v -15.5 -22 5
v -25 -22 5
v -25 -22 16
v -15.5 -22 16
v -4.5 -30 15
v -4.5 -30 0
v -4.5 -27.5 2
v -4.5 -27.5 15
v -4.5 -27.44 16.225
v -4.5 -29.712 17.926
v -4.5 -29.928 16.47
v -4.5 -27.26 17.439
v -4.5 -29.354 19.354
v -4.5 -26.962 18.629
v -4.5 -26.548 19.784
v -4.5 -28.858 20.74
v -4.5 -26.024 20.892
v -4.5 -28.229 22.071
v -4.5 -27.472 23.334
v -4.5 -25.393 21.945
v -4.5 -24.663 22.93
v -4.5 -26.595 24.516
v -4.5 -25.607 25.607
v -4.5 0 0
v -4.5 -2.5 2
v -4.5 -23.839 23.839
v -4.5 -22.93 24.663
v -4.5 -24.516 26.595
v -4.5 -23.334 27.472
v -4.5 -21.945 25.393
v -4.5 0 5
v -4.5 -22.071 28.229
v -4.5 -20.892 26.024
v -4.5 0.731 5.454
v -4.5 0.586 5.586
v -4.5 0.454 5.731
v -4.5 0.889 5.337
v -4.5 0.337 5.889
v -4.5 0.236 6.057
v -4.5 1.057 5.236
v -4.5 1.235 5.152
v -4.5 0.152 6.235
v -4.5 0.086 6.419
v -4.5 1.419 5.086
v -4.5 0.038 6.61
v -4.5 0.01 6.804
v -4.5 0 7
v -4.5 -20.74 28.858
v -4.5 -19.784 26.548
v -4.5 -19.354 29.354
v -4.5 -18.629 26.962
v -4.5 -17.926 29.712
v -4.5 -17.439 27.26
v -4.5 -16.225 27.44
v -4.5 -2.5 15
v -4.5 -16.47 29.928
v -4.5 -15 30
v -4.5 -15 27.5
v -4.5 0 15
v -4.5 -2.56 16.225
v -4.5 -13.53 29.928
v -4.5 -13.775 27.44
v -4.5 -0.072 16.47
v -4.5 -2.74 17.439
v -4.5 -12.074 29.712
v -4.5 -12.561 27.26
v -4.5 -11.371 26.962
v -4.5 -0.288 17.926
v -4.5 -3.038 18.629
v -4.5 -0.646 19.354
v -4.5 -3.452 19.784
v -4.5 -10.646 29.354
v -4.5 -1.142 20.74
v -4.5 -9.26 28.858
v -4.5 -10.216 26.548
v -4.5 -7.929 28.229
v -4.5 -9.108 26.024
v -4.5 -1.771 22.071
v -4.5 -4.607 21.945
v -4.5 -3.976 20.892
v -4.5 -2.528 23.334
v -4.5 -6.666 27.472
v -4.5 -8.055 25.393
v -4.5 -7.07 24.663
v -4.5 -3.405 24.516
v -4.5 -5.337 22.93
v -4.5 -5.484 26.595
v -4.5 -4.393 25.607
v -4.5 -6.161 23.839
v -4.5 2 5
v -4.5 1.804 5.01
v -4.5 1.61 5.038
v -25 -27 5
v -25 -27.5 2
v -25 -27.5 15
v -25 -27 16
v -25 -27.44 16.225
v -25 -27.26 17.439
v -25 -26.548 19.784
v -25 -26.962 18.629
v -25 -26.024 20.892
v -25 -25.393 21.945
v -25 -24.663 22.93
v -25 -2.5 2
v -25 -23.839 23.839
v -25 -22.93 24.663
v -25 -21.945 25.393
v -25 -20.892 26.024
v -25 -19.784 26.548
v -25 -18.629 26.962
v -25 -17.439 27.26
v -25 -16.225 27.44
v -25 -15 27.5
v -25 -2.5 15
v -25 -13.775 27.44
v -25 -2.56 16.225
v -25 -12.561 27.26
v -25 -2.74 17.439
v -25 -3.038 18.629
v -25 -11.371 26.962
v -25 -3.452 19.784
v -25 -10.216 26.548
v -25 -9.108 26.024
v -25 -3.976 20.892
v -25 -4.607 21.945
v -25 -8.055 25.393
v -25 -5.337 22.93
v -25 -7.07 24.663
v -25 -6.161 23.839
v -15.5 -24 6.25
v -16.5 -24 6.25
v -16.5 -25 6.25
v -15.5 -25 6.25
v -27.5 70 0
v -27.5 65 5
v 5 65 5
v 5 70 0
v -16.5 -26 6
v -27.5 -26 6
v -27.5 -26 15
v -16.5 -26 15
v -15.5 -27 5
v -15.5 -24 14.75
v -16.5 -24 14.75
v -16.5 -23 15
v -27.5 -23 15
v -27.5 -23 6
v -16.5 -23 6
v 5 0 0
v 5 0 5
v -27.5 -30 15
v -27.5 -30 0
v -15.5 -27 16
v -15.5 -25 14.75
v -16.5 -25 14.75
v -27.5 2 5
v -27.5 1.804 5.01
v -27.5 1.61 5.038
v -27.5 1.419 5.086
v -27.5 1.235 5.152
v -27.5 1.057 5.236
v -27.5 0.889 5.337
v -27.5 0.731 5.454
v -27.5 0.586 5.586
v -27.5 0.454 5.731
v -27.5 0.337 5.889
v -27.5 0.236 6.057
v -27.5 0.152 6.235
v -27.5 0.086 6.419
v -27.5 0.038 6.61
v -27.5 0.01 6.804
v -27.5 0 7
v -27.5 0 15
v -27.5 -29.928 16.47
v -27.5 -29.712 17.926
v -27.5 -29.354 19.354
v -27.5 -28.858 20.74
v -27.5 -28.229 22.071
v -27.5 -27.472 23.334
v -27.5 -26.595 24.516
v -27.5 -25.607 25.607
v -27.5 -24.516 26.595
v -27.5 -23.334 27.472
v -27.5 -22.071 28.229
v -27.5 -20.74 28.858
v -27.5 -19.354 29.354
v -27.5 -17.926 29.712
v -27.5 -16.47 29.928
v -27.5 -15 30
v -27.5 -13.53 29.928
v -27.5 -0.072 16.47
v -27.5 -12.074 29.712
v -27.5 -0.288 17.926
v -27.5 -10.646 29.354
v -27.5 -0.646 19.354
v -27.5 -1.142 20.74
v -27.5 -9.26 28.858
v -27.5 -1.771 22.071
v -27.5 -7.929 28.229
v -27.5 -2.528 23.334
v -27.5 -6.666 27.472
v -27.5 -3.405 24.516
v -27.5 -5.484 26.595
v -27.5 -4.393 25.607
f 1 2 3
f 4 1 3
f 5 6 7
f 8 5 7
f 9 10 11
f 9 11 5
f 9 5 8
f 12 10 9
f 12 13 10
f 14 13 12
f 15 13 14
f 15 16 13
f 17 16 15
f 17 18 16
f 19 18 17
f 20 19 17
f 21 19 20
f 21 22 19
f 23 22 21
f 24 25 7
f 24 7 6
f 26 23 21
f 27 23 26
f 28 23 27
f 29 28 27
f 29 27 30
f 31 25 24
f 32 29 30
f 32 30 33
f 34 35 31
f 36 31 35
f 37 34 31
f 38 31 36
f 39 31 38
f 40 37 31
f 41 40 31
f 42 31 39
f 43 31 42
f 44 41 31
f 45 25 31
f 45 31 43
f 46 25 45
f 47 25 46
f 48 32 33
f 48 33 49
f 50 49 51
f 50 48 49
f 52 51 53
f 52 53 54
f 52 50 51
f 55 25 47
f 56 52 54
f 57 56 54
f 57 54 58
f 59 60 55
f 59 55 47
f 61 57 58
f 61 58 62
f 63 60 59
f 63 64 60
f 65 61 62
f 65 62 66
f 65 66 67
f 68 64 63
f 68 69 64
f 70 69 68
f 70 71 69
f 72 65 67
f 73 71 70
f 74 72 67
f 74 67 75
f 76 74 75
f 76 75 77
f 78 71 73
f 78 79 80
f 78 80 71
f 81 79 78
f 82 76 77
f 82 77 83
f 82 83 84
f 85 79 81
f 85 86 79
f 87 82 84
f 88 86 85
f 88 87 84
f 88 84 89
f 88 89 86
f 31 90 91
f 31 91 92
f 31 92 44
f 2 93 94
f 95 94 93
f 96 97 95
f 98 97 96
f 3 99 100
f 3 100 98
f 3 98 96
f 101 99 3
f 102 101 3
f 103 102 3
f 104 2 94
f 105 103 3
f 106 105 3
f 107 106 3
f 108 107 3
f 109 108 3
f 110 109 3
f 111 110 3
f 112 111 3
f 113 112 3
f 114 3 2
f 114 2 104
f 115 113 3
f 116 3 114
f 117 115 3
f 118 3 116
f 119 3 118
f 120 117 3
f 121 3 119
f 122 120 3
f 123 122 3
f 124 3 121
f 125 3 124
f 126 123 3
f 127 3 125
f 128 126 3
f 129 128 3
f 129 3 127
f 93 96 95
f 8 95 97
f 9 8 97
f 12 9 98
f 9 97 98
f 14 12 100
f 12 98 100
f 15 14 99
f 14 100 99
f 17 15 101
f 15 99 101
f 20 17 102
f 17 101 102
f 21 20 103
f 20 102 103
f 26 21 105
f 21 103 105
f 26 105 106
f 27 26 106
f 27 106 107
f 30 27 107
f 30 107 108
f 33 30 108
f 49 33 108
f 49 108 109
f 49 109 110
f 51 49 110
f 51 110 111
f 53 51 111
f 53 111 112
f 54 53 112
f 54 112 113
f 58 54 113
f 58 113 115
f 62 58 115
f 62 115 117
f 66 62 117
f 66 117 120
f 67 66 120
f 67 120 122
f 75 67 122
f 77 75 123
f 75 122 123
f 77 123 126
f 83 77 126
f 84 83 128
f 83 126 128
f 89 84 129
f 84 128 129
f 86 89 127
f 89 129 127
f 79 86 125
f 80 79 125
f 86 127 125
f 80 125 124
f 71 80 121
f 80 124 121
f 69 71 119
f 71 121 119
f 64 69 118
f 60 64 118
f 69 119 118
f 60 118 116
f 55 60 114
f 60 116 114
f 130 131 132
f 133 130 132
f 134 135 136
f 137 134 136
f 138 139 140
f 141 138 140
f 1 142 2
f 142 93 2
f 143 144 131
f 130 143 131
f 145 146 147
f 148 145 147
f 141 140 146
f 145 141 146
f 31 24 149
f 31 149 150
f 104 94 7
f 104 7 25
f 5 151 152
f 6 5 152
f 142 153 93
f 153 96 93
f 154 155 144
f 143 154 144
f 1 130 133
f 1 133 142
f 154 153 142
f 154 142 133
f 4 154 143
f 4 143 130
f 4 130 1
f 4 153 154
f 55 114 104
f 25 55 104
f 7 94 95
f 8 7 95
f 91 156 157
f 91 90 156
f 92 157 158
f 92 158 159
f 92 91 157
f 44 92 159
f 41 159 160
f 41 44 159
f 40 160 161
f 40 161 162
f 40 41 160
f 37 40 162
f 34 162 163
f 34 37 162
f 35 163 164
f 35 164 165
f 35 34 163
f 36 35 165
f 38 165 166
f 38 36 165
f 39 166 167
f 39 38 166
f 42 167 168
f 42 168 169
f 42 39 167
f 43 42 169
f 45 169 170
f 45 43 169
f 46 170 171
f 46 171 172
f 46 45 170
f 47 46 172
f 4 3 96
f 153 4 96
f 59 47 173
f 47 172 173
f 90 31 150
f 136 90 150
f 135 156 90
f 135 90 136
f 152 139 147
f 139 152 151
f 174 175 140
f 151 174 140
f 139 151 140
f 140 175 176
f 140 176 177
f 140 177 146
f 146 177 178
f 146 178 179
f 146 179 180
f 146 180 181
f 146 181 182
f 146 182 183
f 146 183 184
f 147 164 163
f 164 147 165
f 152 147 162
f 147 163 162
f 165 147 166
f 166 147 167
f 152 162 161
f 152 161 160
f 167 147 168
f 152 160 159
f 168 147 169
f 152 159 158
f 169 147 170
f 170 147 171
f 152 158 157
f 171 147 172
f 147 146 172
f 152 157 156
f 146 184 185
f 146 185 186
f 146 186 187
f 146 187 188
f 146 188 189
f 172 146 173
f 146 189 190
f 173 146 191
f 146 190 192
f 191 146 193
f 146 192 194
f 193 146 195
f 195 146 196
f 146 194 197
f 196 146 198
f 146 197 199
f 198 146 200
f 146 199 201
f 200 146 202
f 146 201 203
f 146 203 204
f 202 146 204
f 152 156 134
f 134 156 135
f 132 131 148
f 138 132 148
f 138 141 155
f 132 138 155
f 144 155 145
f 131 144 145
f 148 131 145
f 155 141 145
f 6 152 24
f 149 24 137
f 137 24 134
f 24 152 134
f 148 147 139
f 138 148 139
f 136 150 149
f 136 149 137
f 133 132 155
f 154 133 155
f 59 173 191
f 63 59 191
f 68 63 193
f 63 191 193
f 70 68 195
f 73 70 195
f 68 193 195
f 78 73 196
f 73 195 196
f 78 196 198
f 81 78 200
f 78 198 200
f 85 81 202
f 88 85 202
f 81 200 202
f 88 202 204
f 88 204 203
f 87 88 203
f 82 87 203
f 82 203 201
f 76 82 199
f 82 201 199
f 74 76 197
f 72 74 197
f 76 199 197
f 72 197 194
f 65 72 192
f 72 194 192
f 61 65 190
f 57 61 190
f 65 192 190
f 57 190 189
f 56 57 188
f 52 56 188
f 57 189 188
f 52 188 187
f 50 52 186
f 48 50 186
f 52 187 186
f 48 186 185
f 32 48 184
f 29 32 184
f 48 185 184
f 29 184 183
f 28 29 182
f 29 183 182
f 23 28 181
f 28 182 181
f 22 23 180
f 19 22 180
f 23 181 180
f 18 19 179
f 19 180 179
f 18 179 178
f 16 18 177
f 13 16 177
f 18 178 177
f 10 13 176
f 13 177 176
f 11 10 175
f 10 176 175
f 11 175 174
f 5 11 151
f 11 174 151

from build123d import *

# Parameters (mm, degrees)
F1_W      = 0.5
F1_H      = 7.5
F1_H_2    = 1
F2_DEPTH  = 11
F1_W_2    = 25
F1_H_3    = 2
F3_DEPTH  = 2.5
F6_DEPTH  = 1
F1_W_3    = 70
F1_H_4    = 5
F7_DEPTH  = 23
F9_W      = 70
F9_H      = 5
F10_DEPTH = 12.5
F11_SIZE  = 4.99999
F13_R     = 2


# Not quite as in the source:
# - a fillet or chamfer is up to 0.001 mm smaller than in the source, because OpenCascade refuses the exact size


with BuildPart() as f2:
    # F1 (on offset) → F2 (new body)
    with BuildSketch(Plane.YZ.offset(-27.5)):
        Polygon((-26, 6), (-26, 15), (-27, 15), (-27, 5), (-22, 5), (-22, 7.5), (-22.5, 7.5), (-22.5, 15), (-23, 15), (-23, 6), align=None)
        Polygon((-27, 15), (-26, 15), (-23, 15), (-22.5, 15), (-22.5, 16), (-27, 16), align=None)
        with Locations((-22.25, 11.25)):
            Rectangle(F1_W, F1_H)
        with Locations((-22.25, 15.5)):
            Rectangle(F1_W, F1_H_2)
    extrude(amount=F2_DEPTH)

    # F1 (on offset) → F3 (join)
    with BuildSketch(Plane.YZ.offset(-27.5)):
        with BuildLine():
            Line((-27.5, 2), (-2.5, 2))
            Line((-2.5, 2), (-2.5, 15))
            ThreePointArc((-2.5, 15), (-15, 27.5), (-27.5, 15))
            Line((-27.5, 15), (-27.5, 2))
        make_face()
        Polygon((-27, 5), (-27, 15), (-27, 16), (-22.5, 16), (-22.5, 22.5), (-7.5, 22.5), (-7.5, 7.5), (-22, 7.5), (-22, 5), align=None, mode=Mode.SUBTRACT)
        Polygon((-22, 16), (-22, 15), (-22, 7.5), (-7.5, 7.5), (-7.5, 22.5), (-22.5, 22.5), (-22.5, 16), align=None)
        with Locations((-15, 1)):
            Rectangle(F1_W_2, F1_H_3)
    extrude(amount=F3_DEPTH)

    # F5 (on offset) → F6 (join)
    with BuildSketch(Plane.YZ.offset(-16.5)):
        Polygon((-26, 14), (-26, 15), (-23, 15), (-23, 13.8), (-22, 16), (-27, 16), (-27, 5), (-26, 7.2), align=None)
        Polygon((-26, 6), (-26, 7.2), (-27, 5), (-25, 5), (-24, 5), (-22, 5), (-22, 16), (-23, 13.8), (-23, 6), align=None)
        Polygon((-23, 15), (-26, 15), (-26, 14), (-26, 7.2), (-25, 9.4), (-25, 14.75), (-24, 14.75), (-24, 11.6), (-23, 13.8), align=None)
        Polygon((-25, 9.4), (-26, 7.2), (-26, 6), (-23, 6), (-23, 13.8), (-24, 11.6), (-24, 6.25), (-25, 6.25), align=None)
    extrude(amount=F6_DEPTH)

    # F1 (on offset) → F7 (join)
    with BuildSketch(Plane.YZ.offset(-27.5)):
        with BuildLine():
            Line((-2.5, 0), (0, 0))
            Line((0, 0), (0, 5))
            Line((0, 5), (0, 15))
            ThreePointArc((0, 15), (-15, 30), (-30, 15))
            Line((-30, 15), (-30, 0))
            Line((-30, 0), (-27.5, 0))
            Line((-27.5, 0), (-27.5, 2))
            Line((-27.5, 2), (-27.5, 15))
            ThreePointArc((-27.5, 15), (-15, 27.5), (-2.5, 15))
            Line((-2.5, 15), (-2.5, 2))
            Line((-2.5, 2), (-2.5, 0))
        make_face()
        with Locations((35, 2.5)):
            Rectangle(F1_W_3, F1_H_4)
        with Locations((-15, 1)):
            Rectangle(F1_W_2, F1_H_3)
    extrude(amount=F7_DEPTH)

    # F9 (on offset) → F10 (join)
    with BuildSketch(Plane.YZ.offset(-7.5)):
        with Locations((35, 2.5)):
            Rectangle(F9_W, F9_H)
    extrude(amount=F10_DEPTH)

    # F11 (size 5 in the source; OpenCascade refuses exactly that, so slightly less here)
    f11_edges = [f2.edges().sort_by_distance(p)[0] for p in [
        (-11.25, 70, 5),
    ]]
    chamfer(f11_edges, length=F11_SIZE)

    # F13
    f13_edges = [f2.edges().sort_by_distance(p)[0] for p in [
        (-16, 0, 5),
    ]]
    fillet(f13_edges, radius=F13_R)


solid = f2.part
